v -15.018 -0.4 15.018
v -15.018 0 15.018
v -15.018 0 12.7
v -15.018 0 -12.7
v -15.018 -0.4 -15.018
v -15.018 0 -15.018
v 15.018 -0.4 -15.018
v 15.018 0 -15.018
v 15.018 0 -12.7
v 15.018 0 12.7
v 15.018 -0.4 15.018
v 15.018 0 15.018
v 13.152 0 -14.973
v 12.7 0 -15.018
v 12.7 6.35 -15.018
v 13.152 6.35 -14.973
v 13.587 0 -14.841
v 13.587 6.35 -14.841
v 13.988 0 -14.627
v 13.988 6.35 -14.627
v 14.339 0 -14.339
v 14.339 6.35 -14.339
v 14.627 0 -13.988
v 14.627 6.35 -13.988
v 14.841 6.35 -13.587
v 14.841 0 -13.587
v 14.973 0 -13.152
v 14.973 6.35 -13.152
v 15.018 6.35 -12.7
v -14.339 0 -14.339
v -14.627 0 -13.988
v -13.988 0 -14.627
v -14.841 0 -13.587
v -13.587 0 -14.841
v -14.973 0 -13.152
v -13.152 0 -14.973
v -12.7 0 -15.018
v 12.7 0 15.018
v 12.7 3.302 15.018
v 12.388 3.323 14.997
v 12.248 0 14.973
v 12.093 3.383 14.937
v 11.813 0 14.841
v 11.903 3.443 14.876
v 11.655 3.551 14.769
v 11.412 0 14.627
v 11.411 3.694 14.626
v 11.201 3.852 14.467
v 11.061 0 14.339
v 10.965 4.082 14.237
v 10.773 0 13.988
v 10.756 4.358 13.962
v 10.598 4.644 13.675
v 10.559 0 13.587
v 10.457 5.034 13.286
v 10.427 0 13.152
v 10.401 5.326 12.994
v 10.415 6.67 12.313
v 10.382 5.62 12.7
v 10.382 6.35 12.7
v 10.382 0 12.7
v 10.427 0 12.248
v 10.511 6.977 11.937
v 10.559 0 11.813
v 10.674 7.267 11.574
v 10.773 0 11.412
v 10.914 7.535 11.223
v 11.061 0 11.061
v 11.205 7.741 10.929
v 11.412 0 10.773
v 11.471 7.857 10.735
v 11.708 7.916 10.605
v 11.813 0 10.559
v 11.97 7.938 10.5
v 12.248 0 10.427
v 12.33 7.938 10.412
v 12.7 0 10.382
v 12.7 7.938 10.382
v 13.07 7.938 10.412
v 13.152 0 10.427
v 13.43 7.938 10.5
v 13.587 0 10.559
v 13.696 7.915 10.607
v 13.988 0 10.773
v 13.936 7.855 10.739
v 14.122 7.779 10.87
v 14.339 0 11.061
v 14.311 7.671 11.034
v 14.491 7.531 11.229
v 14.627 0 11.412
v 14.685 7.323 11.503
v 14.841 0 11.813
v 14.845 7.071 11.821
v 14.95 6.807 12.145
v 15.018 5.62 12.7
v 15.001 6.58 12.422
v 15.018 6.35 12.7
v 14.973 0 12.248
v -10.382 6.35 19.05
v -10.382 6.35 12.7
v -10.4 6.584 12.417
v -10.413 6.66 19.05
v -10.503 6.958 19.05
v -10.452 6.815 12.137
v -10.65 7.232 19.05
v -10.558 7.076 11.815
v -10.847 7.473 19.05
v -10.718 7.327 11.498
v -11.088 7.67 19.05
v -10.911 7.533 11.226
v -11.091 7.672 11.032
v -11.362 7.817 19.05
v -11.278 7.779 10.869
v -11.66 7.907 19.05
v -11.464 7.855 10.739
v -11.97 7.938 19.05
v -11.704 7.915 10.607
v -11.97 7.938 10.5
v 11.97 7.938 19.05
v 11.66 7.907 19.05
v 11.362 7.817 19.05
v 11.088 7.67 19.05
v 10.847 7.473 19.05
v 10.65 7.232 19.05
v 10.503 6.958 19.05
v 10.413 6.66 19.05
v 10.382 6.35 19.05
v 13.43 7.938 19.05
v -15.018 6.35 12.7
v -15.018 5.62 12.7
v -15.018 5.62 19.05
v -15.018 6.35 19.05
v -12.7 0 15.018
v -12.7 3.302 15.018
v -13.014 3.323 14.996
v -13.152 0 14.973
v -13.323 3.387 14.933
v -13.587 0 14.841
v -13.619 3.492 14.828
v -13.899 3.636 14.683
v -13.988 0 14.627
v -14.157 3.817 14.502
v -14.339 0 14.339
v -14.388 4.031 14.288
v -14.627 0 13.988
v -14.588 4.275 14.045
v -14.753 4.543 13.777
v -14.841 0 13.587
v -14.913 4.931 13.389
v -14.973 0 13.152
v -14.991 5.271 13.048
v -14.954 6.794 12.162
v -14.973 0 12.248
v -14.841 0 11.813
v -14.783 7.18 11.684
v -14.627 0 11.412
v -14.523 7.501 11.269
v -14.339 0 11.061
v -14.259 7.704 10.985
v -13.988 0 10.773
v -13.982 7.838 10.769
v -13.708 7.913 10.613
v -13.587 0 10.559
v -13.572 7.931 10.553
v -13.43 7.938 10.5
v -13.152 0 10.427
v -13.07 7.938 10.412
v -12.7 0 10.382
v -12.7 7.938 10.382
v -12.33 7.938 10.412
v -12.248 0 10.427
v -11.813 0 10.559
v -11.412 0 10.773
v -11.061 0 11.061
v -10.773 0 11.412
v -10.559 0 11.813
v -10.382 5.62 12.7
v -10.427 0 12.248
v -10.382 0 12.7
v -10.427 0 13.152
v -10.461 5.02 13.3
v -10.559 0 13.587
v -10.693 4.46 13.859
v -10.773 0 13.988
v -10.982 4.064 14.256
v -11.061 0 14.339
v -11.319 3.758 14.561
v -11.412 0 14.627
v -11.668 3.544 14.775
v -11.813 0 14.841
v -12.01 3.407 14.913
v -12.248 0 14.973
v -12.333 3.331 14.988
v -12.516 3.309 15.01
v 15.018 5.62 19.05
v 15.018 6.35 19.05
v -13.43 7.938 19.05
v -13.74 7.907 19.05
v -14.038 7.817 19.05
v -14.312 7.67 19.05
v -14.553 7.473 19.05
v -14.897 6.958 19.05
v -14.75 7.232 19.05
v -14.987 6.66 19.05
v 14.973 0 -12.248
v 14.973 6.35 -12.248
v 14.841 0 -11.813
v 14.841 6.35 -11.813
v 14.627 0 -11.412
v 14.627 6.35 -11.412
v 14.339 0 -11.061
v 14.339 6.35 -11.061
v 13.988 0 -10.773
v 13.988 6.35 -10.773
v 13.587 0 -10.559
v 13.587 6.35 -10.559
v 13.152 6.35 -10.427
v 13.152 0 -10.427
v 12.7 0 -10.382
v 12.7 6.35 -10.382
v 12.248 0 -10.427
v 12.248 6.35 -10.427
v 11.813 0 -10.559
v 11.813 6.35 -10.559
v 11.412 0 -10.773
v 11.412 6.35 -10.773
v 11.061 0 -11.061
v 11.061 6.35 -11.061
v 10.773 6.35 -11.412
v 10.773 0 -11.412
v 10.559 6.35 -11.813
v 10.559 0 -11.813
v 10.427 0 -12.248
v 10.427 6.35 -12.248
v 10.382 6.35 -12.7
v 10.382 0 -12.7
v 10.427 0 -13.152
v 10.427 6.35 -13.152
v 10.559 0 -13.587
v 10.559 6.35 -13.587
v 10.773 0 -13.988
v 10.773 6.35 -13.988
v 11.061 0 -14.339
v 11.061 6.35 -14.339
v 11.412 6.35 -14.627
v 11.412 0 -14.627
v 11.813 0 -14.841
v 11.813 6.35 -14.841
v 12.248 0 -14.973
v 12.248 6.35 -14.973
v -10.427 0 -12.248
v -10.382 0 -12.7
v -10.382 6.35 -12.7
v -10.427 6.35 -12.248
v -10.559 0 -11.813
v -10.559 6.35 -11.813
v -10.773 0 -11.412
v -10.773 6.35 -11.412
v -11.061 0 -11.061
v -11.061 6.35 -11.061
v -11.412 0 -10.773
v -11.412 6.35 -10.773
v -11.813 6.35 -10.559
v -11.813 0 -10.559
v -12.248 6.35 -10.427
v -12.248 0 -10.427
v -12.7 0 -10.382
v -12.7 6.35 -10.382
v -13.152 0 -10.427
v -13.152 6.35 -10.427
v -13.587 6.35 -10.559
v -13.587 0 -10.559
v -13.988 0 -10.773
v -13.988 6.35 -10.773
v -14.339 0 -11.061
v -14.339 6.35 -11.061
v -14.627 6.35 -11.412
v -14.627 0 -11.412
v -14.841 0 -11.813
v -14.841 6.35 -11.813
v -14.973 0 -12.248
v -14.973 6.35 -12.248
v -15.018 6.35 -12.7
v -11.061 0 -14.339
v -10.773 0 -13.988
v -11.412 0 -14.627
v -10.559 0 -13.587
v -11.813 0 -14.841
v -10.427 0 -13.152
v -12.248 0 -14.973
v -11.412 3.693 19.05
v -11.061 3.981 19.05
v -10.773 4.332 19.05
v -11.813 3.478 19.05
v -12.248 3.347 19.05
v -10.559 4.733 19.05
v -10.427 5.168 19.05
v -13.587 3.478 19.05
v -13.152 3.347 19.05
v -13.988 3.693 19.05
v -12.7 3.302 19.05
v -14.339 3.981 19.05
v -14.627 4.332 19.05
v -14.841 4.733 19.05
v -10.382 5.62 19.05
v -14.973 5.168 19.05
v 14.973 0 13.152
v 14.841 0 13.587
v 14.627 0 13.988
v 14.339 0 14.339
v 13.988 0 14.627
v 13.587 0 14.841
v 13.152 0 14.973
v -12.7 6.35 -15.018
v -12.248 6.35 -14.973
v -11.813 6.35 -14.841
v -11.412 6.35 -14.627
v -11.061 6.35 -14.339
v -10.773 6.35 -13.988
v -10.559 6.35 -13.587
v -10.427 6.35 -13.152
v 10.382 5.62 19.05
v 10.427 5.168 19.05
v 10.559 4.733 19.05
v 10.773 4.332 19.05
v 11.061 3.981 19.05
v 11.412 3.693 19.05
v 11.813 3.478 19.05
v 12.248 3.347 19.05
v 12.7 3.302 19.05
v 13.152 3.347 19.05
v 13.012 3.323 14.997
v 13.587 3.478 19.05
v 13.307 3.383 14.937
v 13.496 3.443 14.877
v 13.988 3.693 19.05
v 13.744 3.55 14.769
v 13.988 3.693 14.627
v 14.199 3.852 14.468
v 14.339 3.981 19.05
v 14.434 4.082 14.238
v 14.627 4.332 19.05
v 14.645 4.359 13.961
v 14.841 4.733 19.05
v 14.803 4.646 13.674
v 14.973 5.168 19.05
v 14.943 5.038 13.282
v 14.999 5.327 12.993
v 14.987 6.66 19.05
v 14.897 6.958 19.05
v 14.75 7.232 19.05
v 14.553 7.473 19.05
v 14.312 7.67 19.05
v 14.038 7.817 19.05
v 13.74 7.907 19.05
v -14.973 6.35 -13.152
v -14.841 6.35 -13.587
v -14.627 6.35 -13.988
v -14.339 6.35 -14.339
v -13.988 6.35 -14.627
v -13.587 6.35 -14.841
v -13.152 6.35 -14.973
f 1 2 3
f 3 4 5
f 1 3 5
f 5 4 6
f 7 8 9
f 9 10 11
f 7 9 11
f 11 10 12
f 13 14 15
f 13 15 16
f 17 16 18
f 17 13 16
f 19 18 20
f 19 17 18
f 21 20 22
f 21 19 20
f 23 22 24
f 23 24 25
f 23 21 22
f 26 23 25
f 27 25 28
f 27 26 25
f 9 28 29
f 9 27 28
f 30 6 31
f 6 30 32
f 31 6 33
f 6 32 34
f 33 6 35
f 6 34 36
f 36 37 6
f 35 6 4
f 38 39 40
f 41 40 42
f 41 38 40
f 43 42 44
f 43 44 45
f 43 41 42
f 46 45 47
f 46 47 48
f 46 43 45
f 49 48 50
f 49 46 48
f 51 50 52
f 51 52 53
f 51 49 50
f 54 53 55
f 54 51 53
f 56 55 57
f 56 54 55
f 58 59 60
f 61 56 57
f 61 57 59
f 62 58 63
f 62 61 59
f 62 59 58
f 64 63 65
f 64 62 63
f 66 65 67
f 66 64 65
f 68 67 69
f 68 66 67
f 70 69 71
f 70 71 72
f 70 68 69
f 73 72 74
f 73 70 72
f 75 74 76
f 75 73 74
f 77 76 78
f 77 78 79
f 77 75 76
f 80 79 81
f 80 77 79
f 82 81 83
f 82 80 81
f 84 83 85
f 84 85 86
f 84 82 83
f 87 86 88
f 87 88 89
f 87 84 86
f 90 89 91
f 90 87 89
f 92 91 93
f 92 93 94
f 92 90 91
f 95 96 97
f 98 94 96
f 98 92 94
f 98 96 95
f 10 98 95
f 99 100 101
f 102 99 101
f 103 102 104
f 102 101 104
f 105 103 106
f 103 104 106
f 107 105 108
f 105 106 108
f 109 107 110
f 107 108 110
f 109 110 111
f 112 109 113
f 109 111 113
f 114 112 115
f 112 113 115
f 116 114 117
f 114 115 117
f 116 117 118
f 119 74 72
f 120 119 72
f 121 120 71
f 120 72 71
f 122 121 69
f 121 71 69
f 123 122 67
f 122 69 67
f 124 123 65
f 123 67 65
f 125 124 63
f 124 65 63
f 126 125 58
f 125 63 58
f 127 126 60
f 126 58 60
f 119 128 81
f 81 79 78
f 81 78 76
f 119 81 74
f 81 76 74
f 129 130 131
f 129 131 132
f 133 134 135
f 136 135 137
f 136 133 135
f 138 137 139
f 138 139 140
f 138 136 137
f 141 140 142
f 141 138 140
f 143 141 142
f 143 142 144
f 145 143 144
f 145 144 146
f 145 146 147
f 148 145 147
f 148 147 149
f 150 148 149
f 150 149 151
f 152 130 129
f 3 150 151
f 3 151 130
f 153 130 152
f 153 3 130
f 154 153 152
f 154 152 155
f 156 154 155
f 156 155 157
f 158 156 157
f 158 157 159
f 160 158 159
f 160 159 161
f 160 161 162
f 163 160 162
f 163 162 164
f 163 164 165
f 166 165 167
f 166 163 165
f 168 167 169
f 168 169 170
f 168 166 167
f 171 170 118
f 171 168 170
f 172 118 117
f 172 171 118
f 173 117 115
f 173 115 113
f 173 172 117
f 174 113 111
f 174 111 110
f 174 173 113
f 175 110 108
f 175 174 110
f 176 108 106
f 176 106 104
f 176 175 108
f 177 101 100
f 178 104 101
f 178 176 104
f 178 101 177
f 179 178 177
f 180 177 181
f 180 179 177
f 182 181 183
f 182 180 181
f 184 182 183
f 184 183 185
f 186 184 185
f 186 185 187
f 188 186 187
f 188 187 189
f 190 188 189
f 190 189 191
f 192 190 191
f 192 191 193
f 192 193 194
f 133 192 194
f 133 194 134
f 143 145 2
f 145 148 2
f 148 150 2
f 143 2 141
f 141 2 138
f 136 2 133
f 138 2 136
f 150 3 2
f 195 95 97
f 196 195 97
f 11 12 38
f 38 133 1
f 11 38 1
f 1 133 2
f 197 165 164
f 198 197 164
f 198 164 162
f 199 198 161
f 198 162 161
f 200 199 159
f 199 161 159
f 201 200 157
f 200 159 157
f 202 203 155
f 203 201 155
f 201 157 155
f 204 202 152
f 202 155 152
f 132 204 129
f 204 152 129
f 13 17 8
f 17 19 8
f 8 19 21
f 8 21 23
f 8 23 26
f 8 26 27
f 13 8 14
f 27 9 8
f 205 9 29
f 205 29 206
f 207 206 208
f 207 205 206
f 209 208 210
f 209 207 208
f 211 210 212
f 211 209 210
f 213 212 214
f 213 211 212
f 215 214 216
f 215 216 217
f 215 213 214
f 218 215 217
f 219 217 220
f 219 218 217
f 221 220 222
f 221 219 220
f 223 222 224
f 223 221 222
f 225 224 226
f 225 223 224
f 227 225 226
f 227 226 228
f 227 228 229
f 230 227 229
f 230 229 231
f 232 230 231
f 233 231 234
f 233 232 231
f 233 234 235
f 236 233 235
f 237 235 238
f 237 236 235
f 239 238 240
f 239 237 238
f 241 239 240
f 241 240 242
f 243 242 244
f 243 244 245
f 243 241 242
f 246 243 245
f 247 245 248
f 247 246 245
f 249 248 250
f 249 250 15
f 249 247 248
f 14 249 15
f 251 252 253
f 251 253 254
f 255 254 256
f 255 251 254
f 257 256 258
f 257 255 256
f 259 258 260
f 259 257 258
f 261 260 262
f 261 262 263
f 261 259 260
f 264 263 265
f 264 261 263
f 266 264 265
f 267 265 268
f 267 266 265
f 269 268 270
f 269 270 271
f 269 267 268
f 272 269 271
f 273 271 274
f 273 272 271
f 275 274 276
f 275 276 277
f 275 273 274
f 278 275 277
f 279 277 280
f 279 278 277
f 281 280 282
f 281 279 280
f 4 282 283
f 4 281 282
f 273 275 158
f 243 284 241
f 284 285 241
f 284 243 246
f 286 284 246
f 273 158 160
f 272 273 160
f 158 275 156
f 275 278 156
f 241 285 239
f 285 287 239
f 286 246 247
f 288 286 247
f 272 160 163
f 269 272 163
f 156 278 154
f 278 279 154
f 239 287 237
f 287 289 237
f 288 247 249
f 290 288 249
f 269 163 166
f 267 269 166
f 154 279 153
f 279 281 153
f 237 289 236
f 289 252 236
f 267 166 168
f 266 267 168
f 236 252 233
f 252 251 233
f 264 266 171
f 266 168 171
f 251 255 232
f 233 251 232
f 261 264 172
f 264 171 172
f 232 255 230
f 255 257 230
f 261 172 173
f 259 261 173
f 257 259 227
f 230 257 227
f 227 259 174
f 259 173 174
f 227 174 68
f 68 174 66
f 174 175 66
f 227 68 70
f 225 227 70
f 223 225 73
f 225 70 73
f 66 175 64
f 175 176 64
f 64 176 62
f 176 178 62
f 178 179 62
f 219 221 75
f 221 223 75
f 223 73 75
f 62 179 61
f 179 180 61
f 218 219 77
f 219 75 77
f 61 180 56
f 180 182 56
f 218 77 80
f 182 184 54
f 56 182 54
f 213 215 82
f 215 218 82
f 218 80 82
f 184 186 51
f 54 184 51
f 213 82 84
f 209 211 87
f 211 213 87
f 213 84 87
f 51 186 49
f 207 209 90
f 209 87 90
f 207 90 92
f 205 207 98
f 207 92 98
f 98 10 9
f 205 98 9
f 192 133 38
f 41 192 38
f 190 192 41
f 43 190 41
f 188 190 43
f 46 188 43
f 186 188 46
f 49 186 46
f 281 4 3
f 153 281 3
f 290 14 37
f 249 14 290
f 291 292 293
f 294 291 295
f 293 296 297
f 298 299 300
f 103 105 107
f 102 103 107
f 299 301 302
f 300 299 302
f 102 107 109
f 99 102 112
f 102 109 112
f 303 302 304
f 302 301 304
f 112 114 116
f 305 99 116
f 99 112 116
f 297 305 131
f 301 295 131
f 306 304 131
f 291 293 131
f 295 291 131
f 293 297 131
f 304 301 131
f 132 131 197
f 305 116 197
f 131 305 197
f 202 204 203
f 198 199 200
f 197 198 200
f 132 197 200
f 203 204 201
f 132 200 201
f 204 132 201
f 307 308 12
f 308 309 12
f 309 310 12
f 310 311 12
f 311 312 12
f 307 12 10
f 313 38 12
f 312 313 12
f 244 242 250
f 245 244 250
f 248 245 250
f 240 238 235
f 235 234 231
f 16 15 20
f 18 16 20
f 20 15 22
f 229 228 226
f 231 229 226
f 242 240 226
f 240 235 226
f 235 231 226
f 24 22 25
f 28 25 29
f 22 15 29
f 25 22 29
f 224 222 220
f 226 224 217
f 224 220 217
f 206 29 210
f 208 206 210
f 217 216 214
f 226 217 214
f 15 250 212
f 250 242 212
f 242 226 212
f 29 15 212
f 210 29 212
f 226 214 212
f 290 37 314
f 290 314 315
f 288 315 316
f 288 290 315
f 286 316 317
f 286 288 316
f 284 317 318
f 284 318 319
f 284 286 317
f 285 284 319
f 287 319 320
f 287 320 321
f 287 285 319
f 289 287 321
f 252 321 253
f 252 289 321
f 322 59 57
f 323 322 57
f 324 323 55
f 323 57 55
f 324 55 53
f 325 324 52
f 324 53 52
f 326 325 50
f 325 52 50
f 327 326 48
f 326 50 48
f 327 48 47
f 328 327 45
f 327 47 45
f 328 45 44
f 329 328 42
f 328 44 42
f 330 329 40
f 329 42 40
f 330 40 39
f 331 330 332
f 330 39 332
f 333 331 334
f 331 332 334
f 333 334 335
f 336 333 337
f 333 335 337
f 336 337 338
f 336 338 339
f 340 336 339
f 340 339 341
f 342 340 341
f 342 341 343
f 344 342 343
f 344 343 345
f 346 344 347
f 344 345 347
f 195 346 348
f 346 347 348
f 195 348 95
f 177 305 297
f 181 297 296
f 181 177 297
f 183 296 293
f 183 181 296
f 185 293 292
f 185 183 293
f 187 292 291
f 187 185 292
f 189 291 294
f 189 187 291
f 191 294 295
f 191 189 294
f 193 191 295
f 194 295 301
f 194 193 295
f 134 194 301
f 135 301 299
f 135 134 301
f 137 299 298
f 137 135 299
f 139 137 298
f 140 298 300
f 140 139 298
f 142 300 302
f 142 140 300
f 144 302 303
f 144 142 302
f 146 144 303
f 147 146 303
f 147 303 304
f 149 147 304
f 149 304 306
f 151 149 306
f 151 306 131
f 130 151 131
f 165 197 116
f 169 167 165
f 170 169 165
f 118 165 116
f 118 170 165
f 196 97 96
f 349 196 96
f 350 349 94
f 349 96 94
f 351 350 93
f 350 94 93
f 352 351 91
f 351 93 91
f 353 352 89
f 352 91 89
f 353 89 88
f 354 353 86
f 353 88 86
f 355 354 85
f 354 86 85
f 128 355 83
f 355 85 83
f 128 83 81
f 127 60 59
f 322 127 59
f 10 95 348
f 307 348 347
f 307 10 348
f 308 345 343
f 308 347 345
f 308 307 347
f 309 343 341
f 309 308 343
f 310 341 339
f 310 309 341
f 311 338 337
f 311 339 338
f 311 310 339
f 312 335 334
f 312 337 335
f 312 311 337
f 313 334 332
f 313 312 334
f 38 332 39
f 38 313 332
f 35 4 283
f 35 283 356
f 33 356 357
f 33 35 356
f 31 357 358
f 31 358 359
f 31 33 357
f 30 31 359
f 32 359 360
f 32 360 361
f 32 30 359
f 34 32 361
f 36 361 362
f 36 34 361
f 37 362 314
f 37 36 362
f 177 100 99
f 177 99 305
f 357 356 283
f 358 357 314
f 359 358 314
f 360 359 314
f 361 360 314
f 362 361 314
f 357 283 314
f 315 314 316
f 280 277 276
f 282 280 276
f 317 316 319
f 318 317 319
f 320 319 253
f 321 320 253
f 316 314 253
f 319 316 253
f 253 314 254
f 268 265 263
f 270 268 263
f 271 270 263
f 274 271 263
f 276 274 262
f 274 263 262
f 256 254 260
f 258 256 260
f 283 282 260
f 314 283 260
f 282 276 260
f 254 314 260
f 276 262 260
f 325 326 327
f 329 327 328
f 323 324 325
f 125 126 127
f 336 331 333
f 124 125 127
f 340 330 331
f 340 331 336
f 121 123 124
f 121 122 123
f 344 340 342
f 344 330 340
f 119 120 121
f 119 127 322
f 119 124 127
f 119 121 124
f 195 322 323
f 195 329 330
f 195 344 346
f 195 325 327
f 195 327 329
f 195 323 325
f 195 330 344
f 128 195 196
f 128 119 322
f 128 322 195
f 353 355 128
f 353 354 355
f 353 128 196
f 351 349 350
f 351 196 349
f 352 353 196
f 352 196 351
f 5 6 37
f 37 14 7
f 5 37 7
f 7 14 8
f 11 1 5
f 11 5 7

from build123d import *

# Parameters (mm, degrees)
F1_DEPTH    = 0.4
F2_DEPTH    = 6.35
F4_DEPTH    = 7.9375
F6_DEPTH    = 6.35
F7_T1_DEPTH = 14.2875


# Not quite as in the source:
# - a fillet or chamfer that OpenCascade refuses, or shapes differently, is made with other operations: its cross-section is extruded or revolved along the edge and cut away or added
# - a pattern or mirror of a feature is missing from the dataset's text; its kind, count and spacing are read off the source's solid


with BuildPart() as f1:
    # F0 (on Front) → F1 (new body)
    with BuildSketch(Plane.XZ):
        with BuildLine():
            ThreePointArc((-12.7, 15.01775), (-11.0611032579, 14.3388967421), (-10.38225, 12.7))
            ThreePointArc((-10.38225, 12.7), (-12.7, 10.38225), (-15.01775, 12.7))
            Line((-15.01775, 12.7), (-15.01775, -12.7000000336))
            ThreePointArc((-15.01775, -12.7000000336), (-12.7000000168, -10.38225), (-10.38225, -12.7))
            ThreePointArc((-10.38225, -12.7), (-11.0611032579, -14.3388967421), (-12.7, -15.01775))
            Line((-12.7, -15.01775), (12.7, -15.01775))
            ThreePointArc((12.7, -15.01775), (11.0611032579, -11.0611032579), (15.01775, -12.7))
            Line((15.01775, -12.7), (15.01775, 12.7))
            ThreePointArc((15.01775, 12.7), (11.0611032579, 11.0611032579), (12.7, 15.01775))
            Line((12.7, 15.01775), (-12.7, 15.01775))
        make_face()
        with BuildLine():
            ThreePointArc((-10.38225, -12.7), (-12.7000000168, -10.38225), (-15.01775, -12.7000000336))
            ThreePointArc((-15.01775, -12.7000000336), (-14.3388967302, -14.338896754), (-12.7, -15.01775))
            ThreePointArc((-12.7, -15.01775), (-11.0611032579, -14.3388967421), (-10.38225, -12.7))
        make_face()
        with BuildLine():
            ThreePointArc((-15.01775, 12.7), (-12.7, 10.38225), (-10.38225, 12.7))
            ThreePointArc((-10.38225, 12.7), (-11.0611032579, 14.3388967421), (-12.7, 15.01775))
            ThreePointArc((-12.7, 15.01775), (-14.3388967421, 14.3388967421), (-15.01775, 12.7))
        make_face()
        with BuildLine():
            ThreePointArc((15.01775, 12.7), (14.3388967421, 14.3388967421), (12.7, 15.01775))
            ThreePointArc((12.7, 15.01775), (11.0611032579, 11.0611032579), (15.01775, 12.7))
        make_face()
        with BuildLine():
            ThreePointArc((12.7, -15.01775), (14.3388967421, -14.3388967421), (15.01775, -12.7))
            ThreePointArc((15.01775, -12.7), (11.0611032579, -11.0611032579), (12.7, -15.01775))
        make_face()
        with BuildLine():
            ThreePointArc((-15.01775, 12.7), (-14.3388967421, 14.3388967421), (-12.7, 15.01775))
            Line((-12.7, 15.01775), (-15.01775, 15.01775))
            Line((-15.01775, 15.01775), (-15.01775, 12.7))
        make_face()
        with BuildLine():
            Line((15.01775, 15.01775), (12.7, 15.01775))
            ThreePointArc((12.7, 15.01775), (14.3388967421, 14.3388967421), (15.01775, 12.7))
            Line((15.01775, 12.7), (15.01775, 15.01775))
        make_face()
        with BuildLine():
            Line((15.01775, -15.01775), (15.01775, -12.7))
            ThreePointArc((15.01775, -12.7), (14.3388967421, -14.3388967421), (12.7, -15.01775))
            Line((12.7, -15.01775), (15.01775, -15.01775))
        make_face()
        with BuildLine():
            ThreePointArc((-12.7, -15.01775), (-14.3388967302, -14.338896754), (-15.01775, -12.7000000336))
            Line((-15.01775, -12.7000000336), (-15.01775, -15.01775))
            Line((-15.01775, -15.01775), (-12.7, -15.01775))
        make_face()
    extrude(amount=F1_DEPTH)

    # F0 (on Front) → F2 (join)
    with BuildSketch(Plane.XZ):
        with BuildLine():
            ThreePointArc((-15.01775, 12.7), (-12.7, 10.38225), (-10.38225, 12.7))
            ThreePointArc((-10.38225, 12.7), (-11.0611032579, 14.3388967421), (-12.7, 15.01775))
            ThreePointArc((-12.7, 15.01775), (-14.3388967421, 14.3388967421), (-15.01775, 12.7))
        make_face()
        with BuildLine():
            ThreePointArc((-10.38225, -12.7), (-12.7000000168, -10.38225), (-15.01775, -12.7000000336))
            ThreePointArc((-15.01775, -12.7000000336), (-14.3388967302, -14.338896754), (-12.7, -15.01775))
            ThreePointArc((-12.7, -15.01775), (-11.0611032579, -14.3388967421), (-10.38225, -12.7))
        make_face()
        with BuildLine():
            ThreePointArc((12.7, -15.01775), (14.3388967421, -14.3388967421), (15.01775, -12.7))
            ThreePointArc((15.01775, -12.7), (11.0611032579, -11.0611032579), (12.7, -15.01775))
        make_face()
    extrude(amount=-F2_DEPTH)

    # F0 (on Front) → F4 (join)
    with BuildSketch(Plane.XZ):
        with BuildLine():
            ThreePointArc((-15.01775, 12.7), (-12.7, 10.38225), (-10.38225, 12.7))
            ThreePointArc((-10.38225, 12.7), (-11.0611032579, 14.3388967421), (-12.7, 15.01775))
            ThreePointArc((-12.7, 15.01775), (-14.3388967421, 14.3388967421), (-15.01775, 12.7))
        make_face()
        with BuildLine():
            ThreePointArc((15.01775, 12.7), (14.3388967421, 14.3388967421), (12.7, 15.01775))
            ThreePointArc((12.7, 15.01775), (11.0611032579, 11.0611032579), (15.01775, 12.7))
        make_face()
    extrude(amount=-F4_DEPTH)

    # F5 (on plane+point) → F6 (join)
    with BuildSketch(Plane.XY.offset(12.7)):
        with BuildLine():
            Line((15.01775, 5.61975), (15.01775, 7.9375))
            Line((15.01775, 7.9375), (10.38225, 7.9375))
            Line((10.38225, 7.9375), (10.38225, 5.61975))
            ThreePointArc((10.38225, 5.61975), (12.7, 3.302), (15.01775, 5.61975))
        make_face()
    f6 = extrude(amount=F6_DEPTH)

    # F6_copies: F6 across plane
    add(f6.mirror(Plane(origin=(0, 0, 0), x_dir=(0, 0, -1), z_dir=(-1, 0, 0))))

    # F7: fillet of radius 1.5875 on 4 edges, made by hand

    # F7_s2 → F7_t1 (cut)
    with BuildSketch(Plane.XY.offset(8.73125)):
        with BuildLine():
            ThreePointArc((15.01775, 6.35), (14.5527820151, 7.4725320151), (13.43025, 7.9375))
            Line((13.43025, 7.9375), (15.01775, 7.9375))
            Line((15.01775, 7.9375), (15.01775, 6.35))
        make_face()
        with BuildLine():
            ThreePointArc((11.96975, 7.9375), (10.8472179849, 7.4725320151), (10.38225, 6.35))
            Line((10.38225, 6.35), (10.38225, 7.9375))
            Line((10.38225, 7.9375), (11.96975, 7.9375))
        make_face()
        with BuildLine():
            ThreePointArc((-10.38225, 6.35), (-10.8472179849, 7.4725320151), (-11.96975, 7.9375))
            Line((-11.96975, 7.9375), (-10.38225, 7.9375))
            Line((-10.38225, 7.9375), (-10.38225, 6.35))
        make_face()
        with BuildLine():
            ThreePointArc((-13.43025, 7.9375), (-14.5527820151, 7.4725320151), (-15.01775, 6.35))
            Line((-15.01775, 6.35), (-15.01775, 7.9375))
            Line((-15.01775, 7.9375), (-13.43025, 7.9375))
        make_face()
    extrude(amount=F7_T1_DEPTH, mode=Mode.SUBTRACT)


solid = f1.part
